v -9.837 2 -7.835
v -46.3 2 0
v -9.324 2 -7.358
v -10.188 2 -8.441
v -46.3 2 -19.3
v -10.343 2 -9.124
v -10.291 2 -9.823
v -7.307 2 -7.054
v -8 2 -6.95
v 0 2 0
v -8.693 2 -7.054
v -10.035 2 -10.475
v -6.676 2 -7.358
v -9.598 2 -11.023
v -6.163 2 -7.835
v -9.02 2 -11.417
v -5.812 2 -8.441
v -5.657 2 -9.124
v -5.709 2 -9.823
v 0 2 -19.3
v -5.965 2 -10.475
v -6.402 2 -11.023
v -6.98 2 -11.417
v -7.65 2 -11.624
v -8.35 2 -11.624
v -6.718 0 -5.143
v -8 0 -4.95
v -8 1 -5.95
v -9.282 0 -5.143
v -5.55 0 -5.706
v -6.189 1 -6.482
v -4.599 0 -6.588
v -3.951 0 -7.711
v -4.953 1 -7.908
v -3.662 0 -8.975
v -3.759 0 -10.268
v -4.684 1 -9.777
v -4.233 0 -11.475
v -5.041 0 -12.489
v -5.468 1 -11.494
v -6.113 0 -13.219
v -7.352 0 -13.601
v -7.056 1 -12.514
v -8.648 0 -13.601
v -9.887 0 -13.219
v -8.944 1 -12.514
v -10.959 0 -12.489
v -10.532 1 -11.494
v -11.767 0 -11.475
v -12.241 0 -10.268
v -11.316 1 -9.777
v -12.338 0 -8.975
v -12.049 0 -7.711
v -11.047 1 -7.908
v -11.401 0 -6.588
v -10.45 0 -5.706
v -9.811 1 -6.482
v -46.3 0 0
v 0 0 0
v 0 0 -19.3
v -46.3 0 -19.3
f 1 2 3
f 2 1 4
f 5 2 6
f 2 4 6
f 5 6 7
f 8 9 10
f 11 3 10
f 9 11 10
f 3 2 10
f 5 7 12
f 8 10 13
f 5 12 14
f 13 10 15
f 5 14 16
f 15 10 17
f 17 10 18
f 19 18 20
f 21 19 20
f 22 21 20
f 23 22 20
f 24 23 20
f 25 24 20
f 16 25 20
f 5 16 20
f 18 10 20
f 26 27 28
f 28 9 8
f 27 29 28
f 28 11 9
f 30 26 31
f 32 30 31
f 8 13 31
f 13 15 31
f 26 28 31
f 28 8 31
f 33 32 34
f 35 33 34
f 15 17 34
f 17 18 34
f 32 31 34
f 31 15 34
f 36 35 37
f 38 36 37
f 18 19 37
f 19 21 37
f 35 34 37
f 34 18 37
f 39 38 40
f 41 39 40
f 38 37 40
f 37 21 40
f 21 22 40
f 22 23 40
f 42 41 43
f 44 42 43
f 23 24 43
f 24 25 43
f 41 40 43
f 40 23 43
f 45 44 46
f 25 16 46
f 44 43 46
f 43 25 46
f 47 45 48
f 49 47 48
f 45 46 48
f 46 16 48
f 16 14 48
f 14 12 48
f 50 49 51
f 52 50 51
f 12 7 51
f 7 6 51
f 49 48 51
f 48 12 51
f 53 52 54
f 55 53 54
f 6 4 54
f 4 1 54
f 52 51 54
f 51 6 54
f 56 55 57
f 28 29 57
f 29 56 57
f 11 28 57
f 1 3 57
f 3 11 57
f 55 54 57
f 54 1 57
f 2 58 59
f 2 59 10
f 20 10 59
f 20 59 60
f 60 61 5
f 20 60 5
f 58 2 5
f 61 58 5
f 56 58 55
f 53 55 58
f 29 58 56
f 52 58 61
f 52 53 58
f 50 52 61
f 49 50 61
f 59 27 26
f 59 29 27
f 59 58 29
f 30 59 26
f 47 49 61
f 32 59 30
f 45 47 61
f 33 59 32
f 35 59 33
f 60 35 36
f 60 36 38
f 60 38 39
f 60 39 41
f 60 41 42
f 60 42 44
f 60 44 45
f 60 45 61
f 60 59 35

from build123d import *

# Parameters (mm, degrees)
SKETCH_1_W             = 19.3
SKETCH_1_H             = 2
SM_BASE_FLANGE_1_DEPTH = 46.3
SKETCH_7_R             = 2.3
CUT_EXTRUDE_2_DEPTH    = 51.201394403
CHAMFER_2_SIZE         = 2.05


# Sheet-metal steps are written as plain solids
with BuildPart() as part:
    # Sketch 1 → Базовая кромка1 (new body)
    with BuildSketch(Plane(origin=(0, 0, 0), x_dir=(0, 0, -1), z_dir=(1, 0, 0))):
        with Locations((9.65, 1)):
            Rectangle(SKETCH_1_W, SKETCH_1_H)
    extrude(amount=-SM_BASE_FLANGE_1_DEPTH)

    # Эскиз7 → Вырез-Вытянуть2 (cut, through all)
    with BuildSketch(Plane(origin=(0, 2, 0), x_dir=(1, 0, 0), z_dir=(0, 1, 0))):
        with Locations(Location((-8, 9.3, 0), (0, 0, 270))):
            Circle(SKETCH_7_R)
    extrude(amount=-CUT_EXTRUDE_2_DEPTH, mode=Mode.SUBTRACT)

    # Фаска2
    # the kernel refuses this chamfer: 2.05 mm, written as the material it takes off along each edge
    with BuildSketch(Plane(origin=(-8, 0, -9.3), x_dir=(0, 0, 1), z_dir=(-1, 0, 0))) as chamfer_2_piece_1:
        Polygon((2.3 + CHAMFER_2_SIZE, 0), (2.3, CHAMFER_2_SIZE), (2.3, 0), align=None)
    revolve(axis=Axis((-8, 0, -9.3), (0, 1, 0)), mode=Mode.SUBTRACT)


solid = part.part
